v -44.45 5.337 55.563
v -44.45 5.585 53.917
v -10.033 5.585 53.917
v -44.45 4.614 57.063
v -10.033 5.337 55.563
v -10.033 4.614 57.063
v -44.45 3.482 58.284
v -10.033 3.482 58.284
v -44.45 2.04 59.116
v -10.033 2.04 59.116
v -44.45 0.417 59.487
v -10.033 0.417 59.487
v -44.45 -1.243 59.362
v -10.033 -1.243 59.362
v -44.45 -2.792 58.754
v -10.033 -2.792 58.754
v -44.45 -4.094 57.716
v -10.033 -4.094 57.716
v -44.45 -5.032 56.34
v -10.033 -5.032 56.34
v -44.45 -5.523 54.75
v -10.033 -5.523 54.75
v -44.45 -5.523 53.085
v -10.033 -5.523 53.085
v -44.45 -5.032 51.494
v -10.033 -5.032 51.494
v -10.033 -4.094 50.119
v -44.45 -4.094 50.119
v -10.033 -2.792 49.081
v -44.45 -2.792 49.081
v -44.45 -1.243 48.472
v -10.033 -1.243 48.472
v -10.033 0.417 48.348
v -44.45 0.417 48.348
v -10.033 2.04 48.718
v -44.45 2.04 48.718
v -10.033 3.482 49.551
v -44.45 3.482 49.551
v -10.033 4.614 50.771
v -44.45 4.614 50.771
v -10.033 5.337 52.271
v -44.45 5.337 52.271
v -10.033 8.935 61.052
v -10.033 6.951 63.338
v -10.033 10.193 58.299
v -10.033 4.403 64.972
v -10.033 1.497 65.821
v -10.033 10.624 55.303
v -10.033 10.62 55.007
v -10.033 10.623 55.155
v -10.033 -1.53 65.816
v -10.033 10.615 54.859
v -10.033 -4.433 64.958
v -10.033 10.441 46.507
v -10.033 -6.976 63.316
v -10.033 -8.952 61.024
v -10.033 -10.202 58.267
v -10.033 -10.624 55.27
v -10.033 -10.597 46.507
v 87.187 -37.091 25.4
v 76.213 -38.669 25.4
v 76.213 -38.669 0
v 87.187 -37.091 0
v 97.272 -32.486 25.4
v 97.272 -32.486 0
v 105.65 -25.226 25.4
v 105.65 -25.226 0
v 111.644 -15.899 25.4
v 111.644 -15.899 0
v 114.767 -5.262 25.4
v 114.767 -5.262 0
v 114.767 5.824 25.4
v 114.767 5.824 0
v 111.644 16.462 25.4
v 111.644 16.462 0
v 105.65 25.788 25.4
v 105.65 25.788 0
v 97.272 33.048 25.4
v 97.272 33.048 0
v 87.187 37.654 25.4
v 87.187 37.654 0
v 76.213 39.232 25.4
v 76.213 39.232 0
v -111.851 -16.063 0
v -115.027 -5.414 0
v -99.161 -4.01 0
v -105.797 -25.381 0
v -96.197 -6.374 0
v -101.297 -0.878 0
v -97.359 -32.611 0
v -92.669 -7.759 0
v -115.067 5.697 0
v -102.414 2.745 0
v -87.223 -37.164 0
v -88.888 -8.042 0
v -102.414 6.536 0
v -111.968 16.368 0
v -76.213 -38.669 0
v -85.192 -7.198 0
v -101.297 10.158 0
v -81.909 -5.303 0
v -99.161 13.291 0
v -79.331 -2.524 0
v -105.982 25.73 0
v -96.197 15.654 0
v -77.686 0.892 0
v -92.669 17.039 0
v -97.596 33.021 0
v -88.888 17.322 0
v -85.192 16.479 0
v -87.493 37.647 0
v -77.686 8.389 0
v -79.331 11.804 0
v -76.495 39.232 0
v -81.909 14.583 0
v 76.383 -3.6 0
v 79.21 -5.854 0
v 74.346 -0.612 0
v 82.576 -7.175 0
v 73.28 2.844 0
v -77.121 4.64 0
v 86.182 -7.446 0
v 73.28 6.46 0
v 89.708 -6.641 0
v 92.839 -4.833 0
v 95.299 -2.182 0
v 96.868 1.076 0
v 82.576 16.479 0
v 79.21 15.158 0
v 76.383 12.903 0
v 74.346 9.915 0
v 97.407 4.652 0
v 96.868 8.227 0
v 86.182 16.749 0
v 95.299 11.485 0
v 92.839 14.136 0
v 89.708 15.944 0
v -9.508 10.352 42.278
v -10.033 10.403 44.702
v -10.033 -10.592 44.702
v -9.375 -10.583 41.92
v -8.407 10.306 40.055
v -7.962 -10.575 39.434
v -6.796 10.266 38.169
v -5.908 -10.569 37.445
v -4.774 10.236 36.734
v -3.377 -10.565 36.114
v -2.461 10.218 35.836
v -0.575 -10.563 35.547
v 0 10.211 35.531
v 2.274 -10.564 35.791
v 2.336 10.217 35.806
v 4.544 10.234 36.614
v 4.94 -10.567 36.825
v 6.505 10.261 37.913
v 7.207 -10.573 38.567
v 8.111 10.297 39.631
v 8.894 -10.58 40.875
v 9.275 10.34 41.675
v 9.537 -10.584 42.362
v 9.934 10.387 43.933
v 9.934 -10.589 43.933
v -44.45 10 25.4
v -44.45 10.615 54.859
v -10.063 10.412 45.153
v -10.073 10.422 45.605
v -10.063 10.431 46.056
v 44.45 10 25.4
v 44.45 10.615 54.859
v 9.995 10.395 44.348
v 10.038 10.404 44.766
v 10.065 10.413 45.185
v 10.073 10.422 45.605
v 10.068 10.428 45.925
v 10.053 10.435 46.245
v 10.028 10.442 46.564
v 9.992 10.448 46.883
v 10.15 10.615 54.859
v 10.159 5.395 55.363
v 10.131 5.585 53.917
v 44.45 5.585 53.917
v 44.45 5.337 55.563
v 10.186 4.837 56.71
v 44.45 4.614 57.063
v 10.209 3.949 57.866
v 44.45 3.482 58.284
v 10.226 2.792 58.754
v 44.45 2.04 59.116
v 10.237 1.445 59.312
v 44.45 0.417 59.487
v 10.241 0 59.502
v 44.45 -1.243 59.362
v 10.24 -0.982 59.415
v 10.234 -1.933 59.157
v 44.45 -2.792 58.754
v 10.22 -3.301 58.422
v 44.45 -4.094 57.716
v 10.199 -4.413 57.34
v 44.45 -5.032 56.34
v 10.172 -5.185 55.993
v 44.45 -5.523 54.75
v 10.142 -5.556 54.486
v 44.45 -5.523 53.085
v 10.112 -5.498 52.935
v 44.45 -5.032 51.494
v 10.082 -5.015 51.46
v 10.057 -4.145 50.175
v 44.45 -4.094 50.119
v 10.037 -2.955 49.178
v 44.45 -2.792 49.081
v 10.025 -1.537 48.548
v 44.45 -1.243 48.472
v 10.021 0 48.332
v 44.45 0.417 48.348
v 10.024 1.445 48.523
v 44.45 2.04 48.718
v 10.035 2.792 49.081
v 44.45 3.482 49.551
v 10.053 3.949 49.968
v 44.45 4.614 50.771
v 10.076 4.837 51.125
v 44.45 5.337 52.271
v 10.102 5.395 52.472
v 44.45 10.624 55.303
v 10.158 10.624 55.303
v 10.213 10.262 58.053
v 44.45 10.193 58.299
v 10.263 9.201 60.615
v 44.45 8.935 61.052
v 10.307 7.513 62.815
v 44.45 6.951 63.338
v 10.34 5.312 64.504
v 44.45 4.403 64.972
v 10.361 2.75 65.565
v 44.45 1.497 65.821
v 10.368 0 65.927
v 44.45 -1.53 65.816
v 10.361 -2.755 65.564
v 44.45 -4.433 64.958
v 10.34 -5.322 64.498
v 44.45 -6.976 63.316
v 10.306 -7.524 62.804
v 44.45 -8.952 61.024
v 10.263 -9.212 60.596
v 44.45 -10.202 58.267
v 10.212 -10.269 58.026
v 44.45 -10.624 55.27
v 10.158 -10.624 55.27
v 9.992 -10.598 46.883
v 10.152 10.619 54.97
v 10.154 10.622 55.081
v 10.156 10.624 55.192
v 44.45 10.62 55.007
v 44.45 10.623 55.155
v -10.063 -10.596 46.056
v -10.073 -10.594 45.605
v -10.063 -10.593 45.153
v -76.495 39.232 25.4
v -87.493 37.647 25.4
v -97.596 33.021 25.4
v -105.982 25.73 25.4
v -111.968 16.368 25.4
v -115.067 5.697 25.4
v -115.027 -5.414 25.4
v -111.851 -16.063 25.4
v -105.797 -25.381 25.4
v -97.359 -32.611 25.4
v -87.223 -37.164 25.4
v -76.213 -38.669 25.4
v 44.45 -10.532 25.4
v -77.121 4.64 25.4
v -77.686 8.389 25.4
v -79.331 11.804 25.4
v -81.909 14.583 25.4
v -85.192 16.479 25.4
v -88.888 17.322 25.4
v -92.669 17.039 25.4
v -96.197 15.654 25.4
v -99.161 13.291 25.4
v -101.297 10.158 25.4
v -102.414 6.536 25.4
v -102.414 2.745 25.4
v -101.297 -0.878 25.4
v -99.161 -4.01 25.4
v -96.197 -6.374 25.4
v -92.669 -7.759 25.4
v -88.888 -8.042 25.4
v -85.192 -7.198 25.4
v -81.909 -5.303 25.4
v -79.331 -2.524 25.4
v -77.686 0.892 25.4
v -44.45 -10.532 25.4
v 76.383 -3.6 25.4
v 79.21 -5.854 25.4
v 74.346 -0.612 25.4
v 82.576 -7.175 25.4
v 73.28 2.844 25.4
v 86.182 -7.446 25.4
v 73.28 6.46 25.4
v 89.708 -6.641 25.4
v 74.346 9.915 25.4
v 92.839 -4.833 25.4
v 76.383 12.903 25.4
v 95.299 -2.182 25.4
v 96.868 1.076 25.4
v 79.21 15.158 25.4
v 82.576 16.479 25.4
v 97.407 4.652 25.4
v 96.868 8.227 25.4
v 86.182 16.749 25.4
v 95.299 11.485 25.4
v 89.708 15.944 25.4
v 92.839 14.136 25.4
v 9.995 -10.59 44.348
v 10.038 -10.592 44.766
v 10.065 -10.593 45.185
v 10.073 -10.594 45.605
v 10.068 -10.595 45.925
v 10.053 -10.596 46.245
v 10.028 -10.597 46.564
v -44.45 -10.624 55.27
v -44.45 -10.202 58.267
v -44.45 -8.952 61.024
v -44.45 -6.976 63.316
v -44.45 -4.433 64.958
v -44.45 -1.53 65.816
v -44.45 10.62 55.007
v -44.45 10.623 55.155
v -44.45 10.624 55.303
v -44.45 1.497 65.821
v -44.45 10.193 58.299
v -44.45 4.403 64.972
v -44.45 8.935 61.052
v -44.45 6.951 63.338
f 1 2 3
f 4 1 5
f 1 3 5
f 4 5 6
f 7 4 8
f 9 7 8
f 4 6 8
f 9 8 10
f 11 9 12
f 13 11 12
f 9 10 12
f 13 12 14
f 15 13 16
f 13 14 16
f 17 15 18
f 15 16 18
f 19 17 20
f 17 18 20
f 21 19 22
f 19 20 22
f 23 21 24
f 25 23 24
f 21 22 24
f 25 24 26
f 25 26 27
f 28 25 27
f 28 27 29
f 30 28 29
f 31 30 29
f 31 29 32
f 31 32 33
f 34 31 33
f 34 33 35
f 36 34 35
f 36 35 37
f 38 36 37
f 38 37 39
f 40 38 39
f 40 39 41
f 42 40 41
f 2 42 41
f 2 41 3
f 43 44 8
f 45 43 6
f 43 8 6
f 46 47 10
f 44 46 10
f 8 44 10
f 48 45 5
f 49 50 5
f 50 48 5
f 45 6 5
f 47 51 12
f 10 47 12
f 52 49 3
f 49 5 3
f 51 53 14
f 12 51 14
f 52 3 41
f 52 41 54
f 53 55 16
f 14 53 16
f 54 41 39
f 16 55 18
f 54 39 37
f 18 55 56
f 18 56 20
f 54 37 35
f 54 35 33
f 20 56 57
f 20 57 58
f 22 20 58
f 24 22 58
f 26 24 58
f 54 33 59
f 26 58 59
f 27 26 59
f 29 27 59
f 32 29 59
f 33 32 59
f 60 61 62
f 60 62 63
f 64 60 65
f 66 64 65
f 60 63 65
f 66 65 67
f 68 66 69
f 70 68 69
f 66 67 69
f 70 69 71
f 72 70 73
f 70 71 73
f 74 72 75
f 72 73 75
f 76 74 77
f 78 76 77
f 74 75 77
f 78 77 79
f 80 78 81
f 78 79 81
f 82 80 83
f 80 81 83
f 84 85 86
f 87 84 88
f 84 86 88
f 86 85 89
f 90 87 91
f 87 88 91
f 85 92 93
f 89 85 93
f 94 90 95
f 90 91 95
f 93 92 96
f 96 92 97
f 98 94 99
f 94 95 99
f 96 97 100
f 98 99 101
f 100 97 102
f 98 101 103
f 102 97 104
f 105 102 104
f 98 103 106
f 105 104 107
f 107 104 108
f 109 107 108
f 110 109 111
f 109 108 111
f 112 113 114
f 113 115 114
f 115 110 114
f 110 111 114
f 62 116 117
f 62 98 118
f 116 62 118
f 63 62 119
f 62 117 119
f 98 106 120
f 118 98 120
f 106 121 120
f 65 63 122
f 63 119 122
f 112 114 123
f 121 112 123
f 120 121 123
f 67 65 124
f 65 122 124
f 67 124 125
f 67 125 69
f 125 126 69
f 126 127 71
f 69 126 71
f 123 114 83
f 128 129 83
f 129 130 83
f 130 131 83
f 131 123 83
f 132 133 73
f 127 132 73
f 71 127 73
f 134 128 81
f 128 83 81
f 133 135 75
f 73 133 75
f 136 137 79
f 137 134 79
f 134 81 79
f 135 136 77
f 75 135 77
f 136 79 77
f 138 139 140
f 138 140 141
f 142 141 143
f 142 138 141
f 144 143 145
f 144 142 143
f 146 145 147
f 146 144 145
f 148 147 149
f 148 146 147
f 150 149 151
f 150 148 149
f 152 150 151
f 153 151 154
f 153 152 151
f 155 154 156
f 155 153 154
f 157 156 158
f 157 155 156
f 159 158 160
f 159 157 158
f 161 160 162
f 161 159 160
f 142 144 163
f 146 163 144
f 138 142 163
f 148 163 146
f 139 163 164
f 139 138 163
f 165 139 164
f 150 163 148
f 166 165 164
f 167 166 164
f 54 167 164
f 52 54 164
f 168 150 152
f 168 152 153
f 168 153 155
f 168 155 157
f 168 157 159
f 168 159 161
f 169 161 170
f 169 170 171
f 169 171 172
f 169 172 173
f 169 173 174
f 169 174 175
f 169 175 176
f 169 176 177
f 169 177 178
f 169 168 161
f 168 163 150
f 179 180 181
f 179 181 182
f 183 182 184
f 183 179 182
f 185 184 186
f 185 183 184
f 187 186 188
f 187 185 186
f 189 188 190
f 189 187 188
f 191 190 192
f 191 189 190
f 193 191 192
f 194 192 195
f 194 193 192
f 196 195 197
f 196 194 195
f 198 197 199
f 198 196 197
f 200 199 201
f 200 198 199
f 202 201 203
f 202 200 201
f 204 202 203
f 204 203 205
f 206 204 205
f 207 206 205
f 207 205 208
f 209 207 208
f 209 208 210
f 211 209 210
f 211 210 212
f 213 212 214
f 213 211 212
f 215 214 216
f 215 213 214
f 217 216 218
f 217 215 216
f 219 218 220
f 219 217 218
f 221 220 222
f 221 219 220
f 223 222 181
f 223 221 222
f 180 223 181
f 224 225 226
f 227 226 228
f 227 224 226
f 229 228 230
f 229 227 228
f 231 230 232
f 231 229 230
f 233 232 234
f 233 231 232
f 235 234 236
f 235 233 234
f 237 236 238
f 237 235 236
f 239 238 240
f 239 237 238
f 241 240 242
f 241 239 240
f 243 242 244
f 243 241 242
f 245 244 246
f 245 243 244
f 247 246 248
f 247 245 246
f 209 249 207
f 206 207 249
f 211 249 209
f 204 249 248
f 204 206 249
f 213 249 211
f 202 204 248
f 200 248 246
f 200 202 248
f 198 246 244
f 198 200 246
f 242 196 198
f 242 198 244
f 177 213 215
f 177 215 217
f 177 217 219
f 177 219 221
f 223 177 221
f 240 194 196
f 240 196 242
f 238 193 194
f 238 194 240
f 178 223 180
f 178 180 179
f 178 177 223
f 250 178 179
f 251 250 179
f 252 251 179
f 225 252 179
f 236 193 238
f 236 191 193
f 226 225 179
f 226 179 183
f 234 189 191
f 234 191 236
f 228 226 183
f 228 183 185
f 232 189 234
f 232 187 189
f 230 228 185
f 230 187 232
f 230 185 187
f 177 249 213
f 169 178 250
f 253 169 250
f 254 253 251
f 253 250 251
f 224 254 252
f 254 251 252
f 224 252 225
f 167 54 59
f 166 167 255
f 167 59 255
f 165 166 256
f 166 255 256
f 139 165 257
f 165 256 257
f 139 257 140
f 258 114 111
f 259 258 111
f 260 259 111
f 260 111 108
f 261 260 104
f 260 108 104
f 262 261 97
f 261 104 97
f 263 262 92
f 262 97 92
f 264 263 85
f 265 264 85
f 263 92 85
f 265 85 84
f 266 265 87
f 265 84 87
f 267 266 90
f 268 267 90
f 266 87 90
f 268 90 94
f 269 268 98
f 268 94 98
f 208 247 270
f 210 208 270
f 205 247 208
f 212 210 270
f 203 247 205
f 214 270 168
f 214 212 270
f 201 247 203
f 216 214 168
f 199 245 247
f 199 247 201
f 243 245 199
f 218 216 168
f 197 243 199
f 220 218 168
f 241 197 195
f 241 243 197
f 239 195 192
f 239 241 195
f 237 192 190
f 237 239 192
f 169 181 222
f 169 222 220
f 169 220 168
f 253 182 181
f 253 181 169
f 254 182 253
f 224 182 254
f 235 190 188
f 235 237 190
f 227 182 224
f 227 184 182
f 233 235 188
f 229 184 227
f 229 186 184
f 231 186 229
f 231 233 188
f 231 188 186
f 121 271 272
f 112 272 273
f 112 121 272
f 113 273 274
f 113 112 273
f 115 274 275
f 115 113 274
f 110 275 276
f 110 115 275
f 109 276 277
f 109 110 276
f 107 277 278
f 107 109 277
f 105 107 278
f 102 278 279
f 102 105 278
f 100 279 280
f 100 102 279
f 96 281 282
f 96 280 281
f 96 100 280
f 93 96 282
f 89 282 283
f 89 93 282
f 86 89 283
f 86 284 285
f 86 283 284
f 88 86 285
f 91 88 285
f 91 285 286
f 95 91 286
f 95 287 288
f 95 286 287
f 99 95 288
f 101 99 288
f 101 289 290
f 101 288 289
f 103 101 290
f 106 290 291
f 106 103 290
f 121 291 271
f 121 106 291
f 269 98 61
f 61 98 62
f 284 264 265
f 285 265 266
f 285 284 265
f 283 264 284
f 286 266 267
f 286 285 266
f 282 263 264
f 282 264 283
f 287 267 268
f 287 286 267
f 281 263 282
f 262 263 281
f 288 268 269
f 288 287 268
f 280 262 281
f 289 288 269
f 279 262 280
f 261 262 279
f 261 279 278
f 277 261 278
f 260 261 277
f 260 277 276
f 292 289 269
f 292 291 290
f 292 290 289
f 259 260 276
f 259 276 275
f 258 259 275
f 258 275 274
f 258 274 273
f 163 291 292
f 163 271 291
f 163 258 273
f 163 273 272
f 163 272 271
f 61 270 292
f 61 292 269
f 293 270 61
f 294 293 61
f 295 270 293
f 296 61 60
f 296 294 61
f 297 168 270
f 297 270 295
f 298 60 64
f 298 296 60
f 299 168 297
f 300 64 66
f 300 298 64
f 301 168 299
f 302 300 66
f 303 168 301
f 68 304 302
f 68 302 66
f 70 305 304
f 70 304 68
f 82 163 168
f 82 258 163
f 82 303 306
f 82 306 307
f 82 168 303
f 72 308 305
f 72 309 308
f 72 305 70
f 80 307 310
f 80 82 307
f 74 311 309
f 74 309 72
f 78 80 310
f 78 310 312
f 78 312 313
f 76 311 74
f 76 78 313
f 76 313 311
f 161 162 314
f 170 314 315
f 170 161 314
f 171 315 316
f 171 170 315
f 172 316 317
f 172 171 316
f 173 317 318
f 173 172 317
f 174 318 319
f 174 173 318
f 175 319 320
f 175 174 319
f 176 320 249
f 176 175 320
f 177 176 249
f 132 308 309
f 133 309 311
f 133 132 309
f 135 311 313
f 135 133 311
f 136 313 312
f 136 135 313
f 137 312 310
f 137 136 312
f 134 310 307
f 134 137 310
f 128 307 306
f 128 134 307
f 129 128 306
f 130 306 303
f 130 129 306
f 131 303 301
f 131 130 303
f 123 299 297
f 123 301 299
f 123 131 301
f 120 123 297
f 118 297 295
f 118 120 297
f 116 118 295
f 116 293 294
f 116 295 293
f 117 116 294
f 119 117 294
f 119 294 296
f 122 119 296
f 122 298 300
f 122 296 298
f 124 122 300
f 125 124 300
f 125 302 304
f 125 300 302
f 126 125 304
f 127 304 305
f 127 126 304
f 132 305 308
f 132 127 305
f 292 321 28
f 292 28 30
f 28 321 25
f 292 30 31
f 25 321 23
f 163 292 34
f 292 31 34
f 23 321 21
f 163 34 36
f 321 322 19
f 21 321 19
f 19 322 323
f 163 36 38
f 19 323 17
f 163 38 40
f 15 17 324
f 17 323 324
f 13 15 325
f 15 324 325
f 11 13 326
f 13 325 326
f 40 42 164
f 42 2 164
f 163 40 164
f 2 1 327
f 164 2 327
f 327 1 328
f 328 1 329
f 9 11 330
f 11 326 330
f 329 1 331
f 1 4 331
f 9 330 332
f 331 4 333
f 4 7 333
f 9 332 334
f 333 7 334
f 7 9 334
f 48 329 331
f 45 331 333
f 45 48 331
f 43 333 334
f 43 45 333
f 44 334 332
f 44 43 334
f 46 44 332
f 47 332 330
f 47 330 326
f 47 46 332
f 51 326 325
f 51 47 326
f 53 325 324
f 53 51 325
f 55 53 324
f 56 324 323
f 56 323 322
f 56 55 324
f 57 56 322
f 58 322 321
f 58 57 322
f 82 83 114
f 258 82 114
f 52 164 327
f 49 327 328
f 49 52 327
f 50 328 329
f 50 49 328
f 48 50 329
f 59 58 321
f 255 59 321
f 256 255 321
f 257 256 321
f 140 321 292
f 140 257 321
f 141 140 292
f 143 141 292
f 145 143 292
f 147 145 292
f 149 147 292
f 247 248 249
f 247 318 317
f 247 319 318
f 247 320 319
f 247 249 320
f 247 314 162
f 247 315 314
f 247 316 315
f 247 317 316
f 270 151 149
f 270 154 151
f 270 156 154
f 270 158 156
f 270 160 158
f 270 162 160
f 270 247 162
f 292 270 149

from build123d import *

# Parameters (mm, degrees)
F1_DEPTH      = 25.4
F2_R          = 12.7177056433
F2_R_2        = 12.1311661923
F3_DEPTH      = 25.401
F5_DEPTH      = 44.45
F5_DEPTH_BACK = 44.45
F7_DEPTH      = 25.4
F7_DEPTH_BACK = 25.4
F8_R          = 5.5849461746
F9_DEPTH      = 115.4465217498
F9_DEPTH_BACK = 68.58


with BuildPart() as f1:
    # F0 (on Top) → F1 (new body)
    with BuildSketch(Plane.XY):
        with BuildLine():
            Line((76.2133896351, 39.2316170037), (-76.4946267009, 39.2316170037))
            ThreePointArc((-76.4946267009, 39.2316170037), (-115.4452679188, 0.1401025055), (-76.2133896351, -38.6691577733))
            Line((-76.2133896351, -38.6691577733), (76.2133896351, -38.6691577733))
            ThreePointArc((76.2133896351, -38.6691577733), (115.1637770236, 0.2812296152), (76.2133896351, 39.2316170037))
        make_face()
    extrude(amount=F1_DEPTH)

    # F2 (on Top) → F3 (cut, through all)
    with BuildSketch(Plane.XY):
        with Locations((-89.8385569453, 4.6402988955)):
            Circle(F2_R)
        with Locations((85.2755606174, 4.6516866423)):
            Circle(F2_R_2)
    extrude(amount=F3_DEPTH, mode=Mode.SUBTRACT)

    # F4 (on Right) → F5 (join, two sides)
    with BuildSketch(Plane.YZ) as f5_sk:
        with BuildLine():
            Line((10.6150543281, 54.8590188052), (10.6243238001, 55.3027279675))
            ThreePointArc((10.6243238001, 55.3027279675), (-0.0164444689, 65.9270390411), (-10.6242728941, 55.2698390691))
            ThreePointArc((-10.6242728941, 55.2698390691), (-0.2054618402, 44.6803910476), (10.6150543281, 54.8590188052))
        make_face()
        with BuildLine():
            ThreePointArc((10.6150543281, 54.8590188052), (10.6220061793, 55.0808249798), (10.6243238001, 55.3027279675))
            Line((10.6243238001, 55.3027279675), (10.6150543281, 54.8590188052))
        make_face()
        with BuildLine():
            ThreePointArc((10.6150543281, 54.8590188052), (-0.2054618402, 44.6803910476), (-10.6242728941, 55.2698390691))
            Line((-10.6242728941, 55.2698390691), (-10.4871375507, 10.9702917508))
            Line((-10.4871375507, 10.9702917508), (9.6981804819, 10.9702917508))
            Line((9.6981804819, 10.9702917508), (10.6150543281, 54.8590188052))
        make_face()
    extrude(amount=F5_DEPTH)
    extrude(f5_sk.sketch, amount=-F5_DEPTH_BACK)

    # F6 (on Front) → F7 (cut, two sides)
    with BuildSketch(Plane.XZ) as f7_sk:
        with BuildLine():
            Line((-10.0329583581, 46.5069847835), (-10.0329583581, 44.7021064626))
            ThreePointArc((-10.0329583581, 44.7021064626), (-0.3878303842, 35.5385515118), (9.9337786678, 43.9328126198))
            Line((9.9337786678, 43.9328126198), (9.9920310872, 46.8828118731))
            ThreePointArc((9.9920310872, 46.8828118731), (-0.1890244976, 55.676234637), (-10.0329583581, 46.5069847835))
        make_face()
        with BuildLine():
            ThreePointArc((-10.0329583581, 46.5069847835), (-10.0734626546, 45.6045456231), (-10.0329583581, 44.7021064626))
            Line((-10.0329583581, 44.7021064626), (-10.0329583581, 46.5069847835))
        make_face()
        with BuildLine():
            Line((9.9920310872, 46.8828118731), (9.9337786678, 43.9328126198))
            ThreePointArc((9.9337786678, 43.9328126198), (10.038480918, 44.7657663239), (10.0734626546, 45.6045456231))
            ThreePointArc((10.0734626546, 45.6045456231), (10.0530841501, 46.2449743283), (9.9920310872, 46.8828118731))
        make_face()
        with BuildLine():
            Line((-10.0329583581, 72.3900050139), (-10.0329583581, 46.5069847835))
            ThreePointArc((-10.0329583581, 46.5069847835), (-0.1890244976, 55.676234637), (9.9920310872, 46.8828118731))
            Line((9.9920310872, 46.8828118731), (10.495711118, 72.3900050139))
            Line((10.495711118, 72.3900050139), (-10.0329583581, 72.3900050139))
        make_face()
    extrude(amount=-F7_DEPTH, mode=Mode.SUBTRACT)
    extrude(f7_sk.sketch, amount=F7_DEPTH_BACK, mode=Mode.SUBTRACT)

    # F8 (on Right) → F9 (cut, two sides)
    with BuildSketch(Plane.YZ) as f9_sk:
        with Locations((0, 53.9172701538)):
            Circle(F8_R)
    extrude(amount=-F9_DEPTH, mode=Mode.SUBTRACT)
    extrude(f9_sk.sketch, amount=F9_DEPTH_BACK, mode=Mode.SUBTRACT)


solid = f1.part
